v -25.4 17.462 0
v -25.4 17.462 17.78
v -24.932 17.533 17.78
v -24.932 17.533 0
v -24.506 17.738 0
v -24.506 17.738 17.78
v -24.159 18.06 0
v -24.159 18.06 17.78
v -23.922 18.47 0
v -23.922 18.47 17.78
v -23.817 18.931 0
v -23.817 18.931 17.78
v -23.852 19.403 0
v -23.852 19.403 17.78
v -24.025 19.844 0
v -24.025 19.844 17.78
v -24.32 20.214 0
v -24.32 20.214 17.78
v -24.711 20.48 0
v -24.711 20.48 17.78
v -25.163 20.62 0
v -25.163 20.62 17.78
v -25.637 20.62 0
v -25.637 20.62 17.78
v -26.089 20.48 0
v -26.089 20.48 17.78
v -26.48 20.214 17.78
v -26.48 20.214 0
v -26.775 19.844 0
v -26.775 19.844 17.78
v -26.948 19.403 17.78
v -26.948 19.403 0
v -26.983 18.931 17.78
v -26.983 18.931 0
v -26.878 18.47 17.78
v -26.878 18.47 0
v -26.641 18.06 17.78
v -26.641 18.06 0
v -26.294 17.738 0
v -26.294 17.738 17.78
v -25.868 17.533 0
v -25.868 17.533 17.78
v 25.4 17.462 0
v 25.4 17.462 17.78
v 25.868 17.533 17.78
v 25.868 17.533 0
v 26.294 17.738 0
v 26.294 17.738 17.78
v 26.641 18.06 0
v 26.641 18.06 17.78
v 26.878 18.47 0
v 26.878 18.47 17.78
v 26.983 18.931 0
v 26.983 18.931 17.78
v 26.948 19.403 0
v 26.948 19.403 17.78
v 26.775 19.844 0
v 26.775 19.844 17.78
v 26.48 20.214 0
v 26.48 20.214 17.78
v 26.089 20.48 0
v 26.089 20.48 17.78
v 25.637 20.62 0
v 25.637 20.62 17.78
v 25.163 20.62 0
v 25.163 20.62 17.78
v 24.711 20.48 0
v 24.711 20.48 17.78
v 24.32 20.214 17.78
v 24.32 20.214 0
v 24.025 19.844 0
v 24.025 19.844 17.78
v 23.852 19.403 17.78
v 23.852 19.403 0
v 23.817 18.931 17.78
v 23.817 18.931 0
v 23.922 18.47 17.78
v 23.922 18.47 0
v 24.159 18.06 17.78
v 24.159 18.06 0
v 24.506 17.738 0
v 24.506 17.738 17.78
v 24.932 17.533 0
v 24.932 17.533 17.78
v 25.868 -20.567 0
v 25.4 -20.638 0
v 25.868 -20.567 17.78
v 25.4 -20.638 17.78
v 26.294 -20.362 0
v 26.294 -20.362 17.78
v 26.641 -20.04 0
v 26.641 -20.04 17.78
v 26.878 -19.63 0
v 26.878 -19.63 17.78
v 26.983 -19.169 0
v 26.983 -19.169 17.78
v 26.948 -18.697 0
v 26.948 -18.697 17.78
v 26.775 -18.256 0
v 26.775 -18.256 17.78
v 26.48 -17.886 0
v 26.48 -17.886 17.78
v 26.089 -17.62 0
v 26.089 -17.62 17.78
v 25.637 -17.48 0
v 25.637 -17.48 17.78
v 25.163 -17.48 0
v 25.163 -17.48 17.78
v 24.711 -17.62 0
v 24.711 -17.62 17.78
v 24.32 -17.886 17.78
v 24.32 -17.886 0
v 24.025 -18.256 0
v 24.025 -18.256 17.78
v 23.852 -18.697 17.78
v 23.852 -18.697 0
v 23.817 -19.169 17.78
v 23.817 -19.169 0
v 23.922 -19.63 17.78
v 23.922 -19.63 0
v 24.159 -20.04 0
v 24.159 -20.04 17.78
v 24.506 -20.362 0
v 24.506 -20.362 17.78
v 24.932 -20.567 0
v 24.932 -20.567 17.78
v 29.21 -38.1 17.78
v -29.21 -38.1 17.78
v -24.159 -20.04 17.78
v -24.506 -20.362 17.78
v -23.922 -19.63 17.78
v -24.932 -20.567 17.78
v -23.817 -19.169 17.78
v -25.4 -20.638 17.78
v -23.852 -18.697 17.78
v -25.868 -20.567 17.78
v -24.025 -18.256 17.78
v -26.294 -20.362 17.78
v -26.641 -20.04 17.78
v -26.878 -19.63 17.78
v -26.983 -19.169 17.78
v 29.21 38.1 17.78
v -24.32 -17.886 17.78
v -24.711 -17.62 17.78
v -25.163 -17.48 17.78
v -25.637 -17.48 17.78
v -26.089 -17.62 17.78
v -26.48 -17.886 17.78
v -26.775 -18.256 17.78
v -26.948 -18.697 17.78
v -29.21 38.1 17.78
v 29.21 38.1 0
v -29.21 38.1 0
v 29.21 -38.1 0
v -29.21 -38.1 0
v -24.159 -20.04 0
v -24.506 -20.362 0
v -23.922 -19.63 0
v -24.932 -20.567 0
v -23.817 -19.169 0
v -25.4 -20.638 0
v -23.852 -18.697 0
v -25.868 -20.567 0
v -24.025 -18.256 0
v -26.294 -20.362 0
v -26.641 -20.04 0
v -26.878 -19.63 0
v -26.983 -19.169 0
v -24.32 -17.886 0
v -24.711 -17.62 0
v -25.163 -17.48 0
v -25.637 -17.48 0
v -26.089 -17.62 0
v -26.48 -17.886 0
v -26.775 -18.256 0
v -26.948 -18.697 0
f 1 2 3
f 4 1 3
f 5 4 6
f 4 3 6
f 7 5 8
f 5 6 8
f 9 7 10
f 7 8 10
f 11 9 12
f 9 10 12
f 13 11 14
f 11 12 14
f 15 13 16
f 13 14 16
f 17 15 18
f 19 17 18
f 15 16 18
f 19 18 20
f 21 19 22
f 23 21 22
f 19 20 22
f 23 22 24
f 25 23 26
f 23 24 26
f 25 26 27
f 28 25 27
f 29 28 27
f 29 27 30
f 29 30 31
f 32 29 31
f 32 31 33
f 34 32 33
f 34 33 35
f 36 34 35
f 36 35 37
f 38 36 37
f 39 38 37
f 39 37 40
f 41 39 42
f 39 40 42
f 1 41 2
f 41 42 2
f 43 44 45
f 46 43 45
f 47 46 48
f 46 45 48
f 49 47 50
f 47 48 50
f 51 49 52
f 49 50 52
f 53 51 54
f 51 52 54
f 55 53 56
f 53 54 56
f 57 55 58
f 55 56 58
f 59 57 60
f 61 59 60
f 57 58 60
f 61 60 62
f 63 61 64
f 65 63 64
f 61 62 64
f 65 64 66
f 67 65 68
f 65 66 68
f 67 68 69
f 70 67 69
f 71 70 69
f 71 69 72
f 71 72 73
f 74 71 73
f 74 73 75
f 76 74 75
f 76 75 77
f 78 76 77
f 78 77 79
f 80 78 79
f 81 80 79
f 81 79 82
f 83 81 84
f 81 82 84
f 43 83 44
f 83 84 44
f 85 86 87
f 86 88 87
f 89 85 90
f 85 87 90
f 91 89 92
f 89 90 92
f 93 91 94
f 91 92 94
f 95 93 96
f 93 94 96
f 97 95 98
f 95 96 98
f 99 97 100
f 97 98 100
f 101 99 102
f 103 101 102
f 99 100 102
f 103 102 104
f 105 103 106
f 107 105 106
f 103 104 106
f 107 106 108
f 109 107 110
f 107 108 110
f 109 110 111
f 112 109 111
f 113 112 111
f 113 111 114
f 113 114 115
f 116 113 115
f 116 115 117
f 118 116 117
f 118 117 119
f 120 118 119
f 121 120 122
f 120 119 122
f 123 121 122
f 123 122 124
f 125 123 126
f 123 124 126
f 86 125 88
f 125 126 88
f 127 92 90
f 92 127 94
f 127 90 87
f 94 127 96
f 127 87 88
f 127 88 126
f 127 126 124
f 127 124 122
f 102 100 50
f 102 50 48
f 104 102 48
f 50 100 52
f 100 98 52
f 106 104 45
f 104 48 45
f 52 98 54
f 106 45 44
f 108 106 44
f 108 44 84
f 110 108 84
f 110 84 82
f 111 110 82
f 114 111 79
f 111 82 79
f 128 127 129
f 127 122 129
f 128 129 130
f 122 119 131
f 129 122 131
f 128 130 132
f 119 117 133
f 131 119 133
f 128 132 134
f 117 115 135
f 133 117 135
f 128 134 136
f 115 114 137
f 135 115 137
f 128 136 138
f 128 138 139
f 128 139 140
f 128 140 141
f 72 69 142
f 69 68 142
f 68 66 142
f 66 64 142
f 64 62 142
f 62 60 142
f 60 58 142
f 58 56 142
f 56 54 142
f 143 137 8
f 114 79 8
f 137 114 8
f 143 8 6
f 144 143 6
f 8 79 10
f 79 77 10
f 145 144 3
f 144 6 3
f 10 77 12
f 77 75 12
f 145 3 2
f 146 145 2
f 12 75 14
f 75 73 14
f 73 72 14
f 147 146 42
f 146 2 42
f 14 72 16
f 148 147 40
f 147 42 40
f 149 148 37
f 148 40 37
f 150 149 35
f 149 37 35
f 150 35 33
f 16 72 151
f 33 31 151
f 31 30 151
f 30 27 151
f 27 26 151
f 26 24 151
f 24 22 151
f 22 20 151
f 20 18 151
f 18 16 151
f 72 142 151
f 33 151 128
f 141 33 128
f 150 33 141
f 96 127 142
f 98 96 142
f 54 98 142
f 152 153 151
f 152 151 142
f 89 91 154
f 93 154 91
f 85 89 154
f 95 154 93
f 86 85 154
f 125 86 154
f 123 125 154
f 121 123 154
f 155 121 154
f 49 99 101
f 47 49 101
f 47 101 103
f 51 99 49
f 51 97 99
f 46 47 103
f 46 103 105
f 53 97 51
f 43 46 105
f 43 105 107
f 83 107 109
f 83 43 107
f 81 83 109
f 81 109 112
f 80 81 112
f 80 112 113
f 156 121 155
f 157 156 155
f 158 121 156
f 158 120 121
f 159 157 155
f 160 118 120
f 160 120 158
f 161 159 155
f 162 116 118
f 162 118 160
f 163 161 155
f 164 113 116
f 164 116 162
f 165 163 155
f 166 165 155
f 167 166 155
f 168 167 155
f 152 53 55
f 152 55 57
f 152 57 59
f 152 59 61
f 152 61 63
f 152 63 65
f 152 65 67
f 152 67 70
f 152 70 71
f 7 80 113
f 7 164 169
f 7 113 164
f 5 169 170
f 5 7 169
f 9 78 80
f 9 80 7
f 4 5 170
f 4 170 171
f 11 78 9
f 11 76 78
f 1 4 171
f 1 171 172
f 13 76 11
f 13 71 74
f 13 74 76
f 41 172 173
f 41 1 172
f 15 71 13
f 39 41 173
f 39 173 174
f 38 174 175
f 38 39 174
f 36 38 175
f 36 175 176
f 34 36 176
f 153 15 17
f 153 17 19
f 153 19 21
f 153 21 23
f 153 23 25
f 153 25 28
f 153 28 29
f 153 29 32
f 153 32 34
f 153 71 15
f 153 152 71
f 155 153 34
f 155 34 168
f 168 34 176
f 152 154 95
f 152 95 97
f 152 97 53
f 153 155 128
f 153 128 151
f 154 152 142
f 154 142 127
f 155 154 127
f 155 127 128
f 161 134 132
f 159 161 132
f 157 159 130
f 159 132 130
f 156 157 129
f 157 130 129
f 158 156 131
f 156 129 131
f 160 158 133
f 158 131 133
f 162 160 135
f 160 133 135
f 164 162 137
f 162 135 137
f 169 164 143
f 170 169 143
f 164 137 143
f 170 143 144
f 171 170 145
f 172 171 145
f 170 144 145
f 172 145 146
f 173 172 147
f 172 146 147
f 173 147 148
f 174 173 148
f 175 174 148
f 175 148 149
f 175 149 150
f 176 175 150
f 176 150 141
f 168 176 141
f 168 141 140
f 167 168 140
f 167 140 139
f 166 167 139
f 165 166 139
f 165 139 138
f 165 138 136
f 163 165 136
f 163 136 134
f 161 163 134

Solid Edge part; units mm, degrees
sketch "Sketch1" plane through (0, 0, 0) normal (0, 0, 1) x (1, 0, 0)
  line L0 (-29.21, 38.1) -> (29.21, 38.1)
  line L1 (29.21, 38.1) -> (29.21, -38.1)
  line L2 (29.21, -38.1) -> (-29.21, -38.1)
  line L3 (-29.21, -38.1) -> (-29.21, 38.1)
  dimension "D1" = 76.2
  dimension "D2" = 58.42
extrude "Protrusion1" add sketch "Sketch1" along normal blind 17.78
hole "Hole_1" at (25.4, 19.05, 17.78) direction (0, 0, -1) diameter 3.175 end up to next
hole "Hole1" at (25.4, -19.05, 17.78) direction (0, 0, -1) diameter 3.175 end up to next
hole "Hole2" at (-25.4, -19.05, 17.78) direction (0, 0, -1) diameter 3.175 end up to next
hole "Hole3" at (-25.4, 19.05, 17.78) direction (0, 0, -1) diameter 3.175 end up to next
